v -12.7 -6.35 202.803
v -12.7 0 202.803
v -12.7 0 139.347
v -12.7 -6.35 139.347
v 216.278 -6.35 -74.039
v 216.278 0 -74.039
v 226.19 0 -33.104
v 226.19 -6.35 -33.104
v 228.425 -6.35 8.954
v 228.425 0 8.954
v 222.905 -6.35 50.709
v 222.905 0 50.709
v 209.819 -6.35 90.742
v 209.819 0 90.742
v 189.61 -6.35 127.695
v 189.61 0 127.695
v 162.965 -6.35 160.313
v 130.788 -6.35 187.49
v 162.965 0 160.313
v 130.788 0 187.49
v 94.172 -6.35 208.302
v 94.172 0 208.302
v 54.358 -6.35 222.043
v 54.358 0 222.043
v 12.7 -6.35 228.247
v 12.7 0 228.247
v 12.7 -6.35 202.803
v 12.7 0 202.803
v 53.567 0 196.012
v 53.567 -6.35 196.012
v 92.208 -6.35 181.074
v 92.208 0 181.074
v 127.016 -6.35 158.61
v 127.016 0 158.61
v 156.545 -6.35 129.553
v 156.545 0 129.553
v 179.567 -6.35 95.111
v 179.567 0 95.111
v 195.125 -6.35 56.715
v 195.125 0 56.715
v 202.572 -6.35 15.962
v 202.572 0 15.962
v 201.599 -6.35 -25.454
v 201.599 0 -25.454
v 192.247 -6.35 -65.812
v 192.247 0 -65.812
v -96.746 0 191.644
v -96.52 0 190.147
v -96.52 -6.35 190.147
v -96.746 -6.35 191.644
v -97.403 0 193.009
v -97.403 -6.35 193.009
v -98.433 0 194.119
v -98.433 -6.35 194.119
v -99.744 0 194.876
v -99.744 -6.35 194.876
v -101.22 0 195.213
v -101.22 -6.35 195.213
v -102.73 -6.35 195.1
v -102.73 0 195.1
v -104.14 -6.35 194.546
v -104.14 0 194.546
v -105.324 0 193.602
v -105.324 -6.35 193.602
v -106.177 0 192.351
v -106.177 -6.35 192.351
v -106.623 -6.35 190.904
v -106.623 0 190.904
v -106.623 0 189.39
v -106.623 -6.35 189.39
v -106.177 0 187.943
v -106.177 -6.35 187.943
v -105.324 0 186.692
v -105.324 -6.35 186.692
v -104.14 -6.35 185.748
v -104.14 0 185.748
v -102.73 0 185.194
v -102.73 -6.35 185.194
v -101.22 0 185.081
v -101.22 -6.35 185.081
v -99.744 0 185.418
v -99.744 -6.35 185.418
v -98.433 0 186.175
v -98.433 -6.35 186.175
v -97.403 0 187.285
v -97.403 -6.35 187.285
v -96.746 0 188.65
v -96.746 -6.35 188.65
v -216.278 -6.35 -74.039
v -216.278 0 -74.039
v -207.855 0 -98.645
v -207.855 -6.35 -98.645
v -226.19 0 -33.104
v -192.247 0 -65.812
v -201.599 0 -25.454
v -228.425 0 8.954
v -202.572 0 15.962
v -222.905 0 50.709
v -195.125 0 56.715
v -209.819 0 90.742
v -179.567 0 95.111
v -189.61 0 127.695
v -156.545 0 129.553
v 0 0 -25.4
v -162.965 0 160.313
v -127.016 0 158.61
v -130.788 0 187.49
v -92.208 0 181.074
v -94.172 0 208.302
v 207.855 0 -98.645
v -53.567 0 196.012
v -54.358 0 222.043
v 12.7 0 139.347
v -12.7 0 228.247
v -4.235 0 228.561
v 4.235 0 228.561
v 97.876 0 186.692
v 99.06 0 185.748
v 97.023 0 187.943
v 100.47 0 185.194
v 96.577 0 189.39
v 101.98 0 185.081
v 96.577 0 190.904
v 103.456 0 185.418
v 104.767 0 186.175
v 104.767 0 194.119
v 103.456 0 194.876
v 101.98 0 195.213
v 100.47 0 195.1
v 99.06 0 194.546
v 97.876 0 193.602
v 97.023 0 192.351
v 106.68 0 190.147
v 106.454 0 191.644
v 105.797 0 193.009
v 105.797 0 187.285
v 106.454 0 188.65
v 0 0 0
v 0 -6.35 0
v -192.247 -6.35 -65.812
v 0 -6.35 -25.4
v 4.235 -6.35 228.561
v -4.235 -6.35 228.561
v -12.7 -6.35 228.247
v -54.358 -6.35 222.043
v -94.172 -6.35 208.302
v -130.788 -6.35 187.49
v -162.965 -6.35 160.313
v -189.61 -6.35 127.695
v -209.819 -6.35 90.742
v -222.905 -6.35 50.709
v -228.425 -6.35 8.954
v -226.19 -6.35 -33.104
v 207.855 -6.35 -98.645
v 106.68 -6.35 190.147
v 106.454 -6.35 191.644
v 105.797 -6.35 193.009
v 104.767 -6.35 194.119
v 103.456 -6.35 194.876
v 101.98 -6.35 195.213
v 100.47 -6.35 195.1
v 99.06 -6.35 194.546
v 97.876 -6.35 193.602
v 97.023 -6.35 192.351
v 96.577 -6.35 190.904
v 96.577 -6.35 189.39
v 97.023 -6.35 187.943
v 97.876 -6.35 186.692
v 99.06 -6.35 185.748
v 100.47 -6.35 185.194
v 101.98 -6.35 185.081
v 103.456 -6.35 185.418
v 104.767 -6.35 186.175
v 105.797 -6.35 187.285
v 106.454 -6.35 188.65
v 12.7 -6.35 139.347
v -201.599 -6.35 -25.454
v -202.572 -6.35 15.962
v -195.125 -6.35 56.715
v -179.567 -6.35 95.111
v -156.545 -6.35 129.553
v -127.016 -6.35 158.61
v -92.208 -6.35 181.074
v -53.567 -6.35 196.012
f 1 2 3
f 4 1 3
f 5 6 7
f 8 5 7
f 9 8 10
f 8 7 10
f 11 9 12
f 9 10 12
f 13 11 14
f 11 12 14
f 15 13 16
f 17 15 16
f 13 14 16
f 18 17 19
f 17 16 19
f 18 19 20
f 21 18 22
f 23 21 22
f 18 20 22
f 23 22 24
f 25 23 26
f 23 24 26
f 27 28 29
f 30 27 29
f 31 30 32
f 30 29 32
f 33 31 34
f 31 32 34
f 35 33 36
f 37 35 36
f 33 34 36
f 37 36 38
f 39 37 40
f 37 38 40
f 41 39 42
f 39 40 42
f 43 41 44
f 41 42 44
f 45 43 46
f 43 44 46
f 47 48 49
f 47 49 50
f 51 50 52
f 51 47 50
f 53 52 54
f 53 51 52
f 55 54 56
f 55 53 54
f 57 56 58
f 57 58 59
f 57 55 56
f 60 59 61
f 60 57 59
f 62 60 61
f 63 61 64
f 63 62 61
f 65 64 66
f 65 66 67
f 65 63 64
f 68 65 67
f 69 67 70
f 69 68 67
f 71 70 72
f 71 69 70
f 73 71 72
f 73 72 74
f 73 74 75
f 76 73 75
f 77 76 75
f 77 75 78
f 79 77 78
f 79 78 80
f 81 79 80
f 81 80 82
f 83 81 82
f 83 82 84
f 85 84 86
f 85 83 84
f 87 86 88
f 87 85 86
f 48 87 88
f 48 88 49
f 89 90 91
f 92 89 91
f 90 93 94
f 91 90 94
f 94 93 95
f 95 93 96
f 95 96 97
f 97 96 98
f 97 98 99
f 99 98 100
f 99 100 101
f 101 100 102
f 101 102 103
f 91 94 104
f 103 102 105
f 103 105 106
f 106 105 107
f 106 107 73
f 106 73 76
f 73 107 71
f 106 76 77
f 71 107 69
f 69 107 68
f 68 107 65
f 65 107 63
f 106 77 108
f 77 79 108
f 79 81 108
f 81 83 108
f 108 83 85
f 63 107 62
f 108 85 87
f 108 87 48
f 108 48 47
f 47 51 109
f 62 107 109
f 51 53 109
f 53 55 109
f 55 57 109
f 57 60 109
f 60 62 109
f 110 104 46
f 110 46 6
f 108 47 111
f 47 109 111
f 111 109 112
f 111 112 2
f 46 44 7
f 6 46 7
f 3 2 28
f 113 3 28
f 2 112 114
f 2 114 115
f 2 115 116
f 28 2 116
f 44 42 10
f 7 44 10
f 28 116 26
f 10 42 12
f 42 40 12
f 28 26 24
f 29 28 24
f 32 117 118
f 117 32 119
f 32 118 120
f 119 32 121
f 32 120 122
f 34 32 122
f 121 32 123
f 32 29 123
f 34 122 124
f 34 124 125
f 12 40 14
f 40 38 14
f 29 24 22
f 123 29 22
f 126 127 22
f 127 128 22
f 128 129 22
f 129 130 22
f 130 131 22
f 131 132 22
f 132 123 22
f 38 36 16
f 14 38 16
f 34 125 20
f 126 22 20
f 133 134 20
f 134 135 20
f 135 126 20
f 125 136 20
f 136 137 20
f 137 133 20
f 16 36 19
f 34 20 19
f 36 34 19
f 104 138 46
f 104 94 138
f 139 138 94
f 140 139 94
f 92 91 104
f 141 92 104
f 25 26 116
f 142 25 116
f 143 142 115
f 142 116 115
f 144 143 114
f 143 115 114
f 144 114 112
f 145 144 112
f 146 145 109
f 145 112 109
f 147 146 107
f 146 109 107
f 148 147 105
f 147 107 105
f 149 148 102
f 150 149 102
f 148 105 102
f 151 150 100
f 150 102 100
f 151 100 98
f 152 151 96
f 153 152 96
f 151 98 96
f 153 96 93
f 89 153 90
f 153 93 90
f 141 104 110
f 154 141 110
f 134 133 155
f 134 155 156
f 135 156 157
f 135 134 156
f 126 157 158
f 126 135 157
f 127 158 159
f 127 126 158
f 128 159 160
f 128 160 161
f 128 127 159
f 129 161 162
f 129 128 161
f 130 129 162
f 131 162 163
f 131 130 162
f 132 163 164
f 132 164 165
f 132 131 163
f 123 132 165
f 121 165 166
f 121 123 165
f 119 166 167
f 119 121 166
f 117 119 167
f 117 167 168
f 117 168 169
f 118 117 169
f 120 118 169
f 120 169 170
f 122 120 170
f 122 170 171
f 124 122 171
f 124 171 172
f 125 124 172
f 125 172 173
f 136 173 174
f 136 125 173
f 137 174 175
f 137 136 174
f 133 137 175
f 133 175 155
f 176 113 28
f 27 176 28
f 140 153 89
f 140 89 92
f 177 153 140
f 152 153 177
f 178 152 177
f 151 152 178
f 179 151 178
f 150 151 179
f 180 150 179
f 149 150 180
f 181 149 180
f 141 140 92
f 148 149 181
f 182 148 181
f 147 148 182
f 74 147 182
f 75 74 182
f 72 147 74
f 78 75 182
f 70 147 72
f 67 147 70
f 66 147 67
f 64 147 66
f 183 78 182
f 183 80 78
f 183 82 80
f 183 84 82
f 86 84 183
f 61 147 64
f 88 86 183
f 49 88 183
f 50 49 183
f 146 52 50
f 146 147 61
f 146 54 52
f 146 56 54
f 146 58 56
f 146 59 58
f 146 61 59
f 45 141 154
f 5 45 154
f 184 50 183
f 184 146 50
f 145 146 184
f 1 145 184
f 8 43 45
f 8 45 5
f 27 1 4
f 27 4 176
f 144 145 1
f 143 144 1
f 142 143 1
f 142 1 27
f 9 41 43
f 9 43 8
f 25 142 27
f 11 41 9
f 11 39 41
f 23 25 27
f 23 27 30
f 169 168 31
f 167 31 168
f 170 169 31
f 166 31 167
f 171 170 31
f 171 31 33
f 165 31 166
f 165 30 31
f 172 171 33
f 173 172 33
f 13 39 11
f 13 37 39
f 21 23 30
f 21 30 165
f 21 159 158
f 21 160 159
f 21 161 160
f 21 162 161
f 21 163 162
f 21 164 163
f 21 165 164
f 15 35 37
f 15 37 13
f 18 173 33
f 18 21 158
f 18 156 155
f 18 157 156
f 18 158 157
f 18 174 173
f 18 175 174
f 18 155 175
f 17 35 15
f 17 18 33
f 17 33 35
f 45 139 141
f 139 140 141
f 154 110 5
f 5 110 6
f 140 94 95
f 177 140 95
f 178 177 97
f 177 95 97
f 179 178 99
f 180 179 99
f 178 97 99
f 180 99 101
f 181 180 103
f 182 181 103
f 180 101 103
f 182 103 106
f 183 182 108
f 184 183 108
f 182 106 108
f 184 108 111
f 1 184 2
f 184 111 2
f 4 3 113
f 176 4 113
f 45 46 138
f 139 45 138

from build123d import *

# Parameters (mm, degrees)
F0_R     = 5.08
F1_DEPTH = 6.35


with BuildPart() as f1:
    # F0 (on Front) → F1 (new body)
    with BuildSketch(Plane.XZ):
        Polygon((192.247183, -65.812313), (0, 0), (-192.247183, -65.812313), (-216.278081, -74.038852), (-207.854538, -98.645227), (0, -25.4), (207.854538, -98.645227), (216.278081, -74.038852), align=None)
        with BuildLine():
            Line((-216.278081, -74.038852), (-192.247183, -65.812313))
            ThreePointArc((-192.247183, -65.812313), (-168.935929, 112.919847), (-12.7, 202.802737))
            Line((-12.7, 202.802737), (-12.7, 228.24695))
            ThreePointArc((-12.7, 228.24695), (-189.609907, 127.695118), (-216.278081, -74.038852))
        make_face()
        with Locations((-101.6, 190.14695)):
            Circle(F0_R, mode=Mode.SUBTRACT)
        with BuildLine():
            ThreePointArc((12.7, 202.802737), (168.935929, 112.919847), (192.247183, -65.812313))
            Line((192.247183, -65.812313), (216.278081, -74.038852))
            ThreePointArc((216.278081, -74.038852), (189.609907, 127.695118), (12.7, 228.24695))
            Line((12.7, 228.24695), (12.7, 202.802737))
        make_face()
        with Locations((101.6, 190.14695)):
            Circle(F0_R, mode=Mode.SUBTRACT)
        with BuildLine():
            Line((-12.7, 228.24695), (-12.7, 202.802737))
            ThreePointArc((-12.7, 202.802737), (0, 203.2), (12.7, 202.802737))
            Line((12.7, 202.802737), (12.7, 228.24695))
            ThreePointArc((12.7, 228.24695), (0, 228.6), (-12.7, 228.24695))
        make_face()
        with BuildLine():
            ThreePointArc((12.7, 202.802737), (0, 203.2), (-12.7, 202.802737))
            Line((-12.7, 202.802737), (-12.7, 139.34695))
            Line((-12.7, 139.34695), (12.7, 139.34695))
            Line((12.7, 139.34695), (12.7, 202.802737))
        make_face()
    extrude(amount=F1_DEPTH)


solid = f1.part
